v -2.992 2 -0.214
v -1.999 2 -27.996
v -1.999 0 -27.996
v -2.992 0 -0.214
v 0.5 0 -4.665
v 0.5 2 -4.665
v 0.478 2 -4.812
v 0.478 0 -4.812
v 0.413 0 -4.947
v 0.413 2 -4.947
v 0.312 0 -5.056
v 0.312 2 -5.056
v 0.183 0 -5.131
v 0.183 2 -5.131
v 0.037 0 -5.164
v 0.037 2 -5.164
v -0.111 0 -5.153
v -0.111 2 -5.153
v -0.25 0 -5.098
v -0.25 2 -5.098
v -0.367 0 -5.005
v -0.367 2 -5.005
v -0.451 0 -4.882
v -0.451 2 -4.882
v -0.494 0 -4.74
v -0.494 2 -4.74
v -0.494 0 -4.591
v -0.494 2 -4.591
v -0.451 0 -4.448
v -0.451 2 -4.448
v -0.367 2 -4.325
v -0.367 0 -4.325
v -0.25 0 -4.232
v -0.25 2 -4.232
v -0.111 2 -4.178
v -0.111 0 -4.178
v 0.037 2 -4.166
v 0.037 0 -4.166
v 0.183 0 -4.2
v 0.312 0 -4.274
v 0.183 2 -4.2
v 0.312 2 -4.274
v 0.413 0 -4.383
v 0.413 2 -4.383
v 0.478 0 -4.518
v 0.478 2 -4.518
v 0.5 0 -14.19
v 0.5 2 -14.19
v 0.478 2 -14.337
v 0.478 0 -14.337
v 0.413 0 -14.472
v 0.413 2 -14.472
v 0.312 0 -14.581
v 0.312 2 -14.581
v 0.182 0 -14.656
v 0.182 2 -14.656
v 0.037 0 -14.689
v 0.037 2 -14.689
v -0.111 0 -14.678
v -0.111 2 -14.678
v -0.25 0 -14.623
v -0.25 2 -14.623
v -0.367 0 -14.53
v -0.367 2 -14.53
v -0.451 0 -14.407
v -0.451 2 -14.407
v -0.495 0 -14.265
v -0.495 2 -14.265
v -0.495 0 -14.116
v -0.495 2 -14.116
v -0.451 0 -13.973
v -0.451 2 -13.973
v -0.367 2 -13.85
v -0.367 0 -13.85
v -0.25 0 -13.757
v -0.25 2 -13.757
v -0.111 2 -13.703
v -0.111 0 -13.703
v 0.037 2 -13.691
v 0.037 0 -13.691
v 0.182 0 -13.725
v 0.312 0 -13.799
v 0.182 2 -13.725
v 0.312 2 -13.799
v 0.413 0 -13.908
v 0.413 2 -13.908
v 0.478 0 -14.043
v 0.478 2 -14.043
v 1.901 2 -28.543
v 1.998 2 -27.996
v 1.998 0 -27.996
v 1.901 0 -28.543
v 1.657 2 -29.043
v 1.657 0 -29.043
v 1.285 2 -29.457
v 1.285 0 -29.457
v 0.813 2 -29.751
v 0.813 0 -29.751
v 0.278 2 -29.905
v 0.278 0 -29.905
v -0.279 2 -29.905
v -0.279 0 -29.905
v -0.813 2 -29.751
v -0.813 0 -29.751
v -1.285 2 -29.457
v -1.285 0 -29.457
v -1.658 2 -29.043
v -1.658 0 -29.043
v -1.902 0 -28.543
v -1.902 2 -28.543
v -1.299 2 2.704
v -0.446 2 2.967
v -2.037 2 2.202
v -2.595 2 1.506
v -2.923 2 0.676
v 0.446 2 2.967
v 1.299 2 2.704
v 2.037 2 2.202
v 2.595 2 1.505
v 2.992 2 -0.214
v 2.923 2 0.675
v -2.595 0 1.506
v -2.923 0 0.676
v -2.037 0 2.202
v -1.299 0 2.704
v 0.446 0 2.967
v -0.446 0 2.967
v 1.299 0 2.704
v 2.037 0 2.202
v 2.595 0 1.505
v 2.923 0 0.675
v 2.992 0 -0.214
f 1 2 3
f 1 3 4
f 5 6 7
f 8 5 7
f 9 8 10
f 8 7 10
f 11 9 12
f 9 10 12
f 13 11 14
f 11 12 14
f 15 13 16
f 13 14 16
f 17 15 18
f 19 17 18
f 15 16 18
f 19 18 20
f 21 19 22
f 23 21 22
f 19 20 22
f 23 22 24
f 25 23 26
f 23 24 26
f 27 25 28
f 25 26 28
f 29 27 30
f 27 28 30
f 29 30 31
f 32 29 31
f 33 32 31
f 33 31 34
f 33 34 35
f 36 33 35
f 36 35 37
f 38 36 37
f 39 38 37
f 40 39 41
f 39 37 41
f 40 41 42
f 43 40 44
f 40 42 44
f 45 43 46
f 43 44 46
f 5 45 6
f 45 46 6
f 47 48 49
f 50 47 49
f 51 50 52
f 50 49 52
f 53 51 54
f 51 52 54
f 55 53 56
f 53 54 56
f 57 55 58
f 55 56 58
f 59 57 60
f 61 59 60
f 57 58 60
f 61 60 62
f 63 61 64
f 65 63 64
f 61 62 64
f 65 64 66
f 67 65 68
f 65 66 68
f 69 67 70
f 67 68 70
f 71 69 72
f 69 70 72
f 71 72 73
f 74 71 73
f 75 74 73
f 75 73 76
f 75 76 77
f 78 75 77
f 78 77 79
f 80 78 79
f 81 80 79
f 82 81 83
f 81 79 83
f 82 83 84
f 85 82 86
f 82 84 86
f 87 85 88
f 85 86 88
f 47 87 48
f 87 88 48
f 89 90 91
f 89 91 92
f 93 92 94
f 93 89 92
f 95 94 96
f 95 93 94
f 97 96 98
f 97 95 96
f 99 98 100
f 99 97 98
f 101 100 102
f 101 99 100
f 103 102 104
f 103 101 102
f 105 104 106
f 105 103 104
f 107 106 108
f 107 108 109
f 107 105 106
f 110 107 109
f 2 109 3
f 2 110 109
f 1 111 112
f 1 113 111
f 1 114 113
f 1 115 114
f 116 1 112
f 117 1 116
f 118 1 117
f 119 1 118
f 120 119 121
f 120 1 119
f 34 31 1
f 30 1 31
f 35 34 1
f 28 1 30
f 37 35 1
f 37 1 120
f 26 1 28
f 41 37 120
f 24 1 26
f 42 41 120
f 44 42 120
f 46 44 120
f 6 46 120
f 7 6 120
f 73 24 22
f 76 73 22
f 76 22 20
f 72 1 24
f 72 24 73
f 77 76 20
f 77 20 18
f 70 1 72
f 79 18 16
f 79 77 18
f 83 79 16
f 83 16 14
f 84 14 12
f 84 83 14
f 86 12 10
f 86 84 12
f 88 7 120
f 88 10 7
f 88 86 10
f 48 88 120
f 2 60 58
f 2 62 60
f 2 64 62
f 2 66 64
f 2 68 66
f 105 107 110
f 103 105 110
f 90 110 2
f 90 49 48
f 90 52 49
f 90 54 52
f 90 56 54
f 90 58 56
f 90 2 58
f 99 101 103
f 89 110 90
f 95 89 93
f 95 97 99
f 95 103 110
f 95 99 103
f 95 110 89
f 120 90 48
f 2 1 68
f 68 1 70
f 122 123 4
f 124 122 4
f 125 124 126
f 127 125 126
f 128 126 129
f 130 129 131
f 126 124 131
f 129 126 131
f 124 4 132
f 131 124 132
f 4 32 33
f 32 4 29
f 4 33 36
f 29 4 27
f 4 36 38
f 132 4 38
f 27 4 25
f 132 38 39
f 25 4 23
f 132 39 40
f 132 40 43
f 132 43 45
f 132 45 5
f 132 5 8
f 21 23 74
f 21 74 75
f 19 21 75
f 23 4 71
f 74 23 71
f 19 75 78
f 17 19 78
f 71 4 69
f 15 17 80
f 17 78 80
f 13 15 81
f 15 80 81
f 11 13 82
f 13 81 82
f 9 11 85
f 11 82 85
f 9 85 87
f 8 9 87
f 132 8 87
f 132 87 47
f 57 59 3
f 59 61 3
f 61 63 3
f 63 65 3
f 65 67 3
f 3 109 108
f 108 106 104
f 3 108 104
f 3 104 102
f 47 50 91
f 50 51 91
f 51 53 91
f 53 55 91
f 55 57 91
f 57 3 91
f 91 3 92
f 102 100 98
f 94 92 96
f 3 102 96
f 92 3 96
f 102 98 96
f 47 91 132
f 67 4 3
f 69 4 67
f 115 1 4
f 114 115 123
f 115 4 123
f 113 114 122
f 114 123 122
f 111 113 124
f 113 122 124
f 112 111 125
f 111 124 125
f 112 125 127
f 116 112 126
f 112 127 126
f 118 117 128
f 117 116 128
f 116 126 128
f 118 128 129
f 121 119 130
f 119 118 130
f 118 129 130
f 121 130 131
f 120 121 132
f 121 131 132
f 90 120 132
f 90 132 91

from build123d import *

# Parameters (mm, degrees)
SKETCH1_R           = 3
BOSS_EXTRUDE1_DEPTH = 2
BOSS_EXTRUDE4_DEPTH = 2
SKETCH4_R           = 0.5
CUT_EXTRUDE1_DEPTH  = 2


with BuildPart() as part:
    # Sketch1 → Boss-Extrude1 (new body)
    with BuildSketch(Plane(origin=(0, 0, 0), x_dir=(1, 0, 0), z_dir=(0, 1, 0))):
        Circle(SKETCH1_R)
    extrude(amount=BOSS_EXTRUDE1_DEPTH)

    # Sketch3 → Boss-Extrude4 (add)
    with BuildSketch(Plane(origin=(0, 2, 0), x_dir=(1, 0, 0), z_dir=(0, 1, 0))):
        with BuildLine():
            ThreePointArc((-2.992341362, 0.214226915), (9.2675e-05, -2.999999999), (2.992328121, 0.214411791))
            Line((2.992328121, 0.214411791), (1.998320796, 27.995599459))
            ThreePointArc((1.998320796, 27.995599459), (-0.000428771, 29.924085477), (-1.999123301, 27.995542419))
            Line((-1.999123301, 27.995542419), (-2.992341362, 0.214226915))
        make_face()
    extrude(amount=-BOSS_EXTRUDE4_DEPTH)

    # Sketch4 → Cut-Extrude1 (cut)
    with BuildSketch(Plane(origin=(0, 2, 0), x_dir=(1, 0, 0), z_dir=(0, 1, 0))):
        with Locations((-0.000203324, 14.190099999)):
            Circle(SKETCH4_R)
        with Locations((-6.6844e-05, 4.6651)):
            Circle(SKETCH4_R)
    extrude(amount=-CUT_EXTRUDE1_DEPTH, mode=Mode.SUBTRACT)


solid = part.part
